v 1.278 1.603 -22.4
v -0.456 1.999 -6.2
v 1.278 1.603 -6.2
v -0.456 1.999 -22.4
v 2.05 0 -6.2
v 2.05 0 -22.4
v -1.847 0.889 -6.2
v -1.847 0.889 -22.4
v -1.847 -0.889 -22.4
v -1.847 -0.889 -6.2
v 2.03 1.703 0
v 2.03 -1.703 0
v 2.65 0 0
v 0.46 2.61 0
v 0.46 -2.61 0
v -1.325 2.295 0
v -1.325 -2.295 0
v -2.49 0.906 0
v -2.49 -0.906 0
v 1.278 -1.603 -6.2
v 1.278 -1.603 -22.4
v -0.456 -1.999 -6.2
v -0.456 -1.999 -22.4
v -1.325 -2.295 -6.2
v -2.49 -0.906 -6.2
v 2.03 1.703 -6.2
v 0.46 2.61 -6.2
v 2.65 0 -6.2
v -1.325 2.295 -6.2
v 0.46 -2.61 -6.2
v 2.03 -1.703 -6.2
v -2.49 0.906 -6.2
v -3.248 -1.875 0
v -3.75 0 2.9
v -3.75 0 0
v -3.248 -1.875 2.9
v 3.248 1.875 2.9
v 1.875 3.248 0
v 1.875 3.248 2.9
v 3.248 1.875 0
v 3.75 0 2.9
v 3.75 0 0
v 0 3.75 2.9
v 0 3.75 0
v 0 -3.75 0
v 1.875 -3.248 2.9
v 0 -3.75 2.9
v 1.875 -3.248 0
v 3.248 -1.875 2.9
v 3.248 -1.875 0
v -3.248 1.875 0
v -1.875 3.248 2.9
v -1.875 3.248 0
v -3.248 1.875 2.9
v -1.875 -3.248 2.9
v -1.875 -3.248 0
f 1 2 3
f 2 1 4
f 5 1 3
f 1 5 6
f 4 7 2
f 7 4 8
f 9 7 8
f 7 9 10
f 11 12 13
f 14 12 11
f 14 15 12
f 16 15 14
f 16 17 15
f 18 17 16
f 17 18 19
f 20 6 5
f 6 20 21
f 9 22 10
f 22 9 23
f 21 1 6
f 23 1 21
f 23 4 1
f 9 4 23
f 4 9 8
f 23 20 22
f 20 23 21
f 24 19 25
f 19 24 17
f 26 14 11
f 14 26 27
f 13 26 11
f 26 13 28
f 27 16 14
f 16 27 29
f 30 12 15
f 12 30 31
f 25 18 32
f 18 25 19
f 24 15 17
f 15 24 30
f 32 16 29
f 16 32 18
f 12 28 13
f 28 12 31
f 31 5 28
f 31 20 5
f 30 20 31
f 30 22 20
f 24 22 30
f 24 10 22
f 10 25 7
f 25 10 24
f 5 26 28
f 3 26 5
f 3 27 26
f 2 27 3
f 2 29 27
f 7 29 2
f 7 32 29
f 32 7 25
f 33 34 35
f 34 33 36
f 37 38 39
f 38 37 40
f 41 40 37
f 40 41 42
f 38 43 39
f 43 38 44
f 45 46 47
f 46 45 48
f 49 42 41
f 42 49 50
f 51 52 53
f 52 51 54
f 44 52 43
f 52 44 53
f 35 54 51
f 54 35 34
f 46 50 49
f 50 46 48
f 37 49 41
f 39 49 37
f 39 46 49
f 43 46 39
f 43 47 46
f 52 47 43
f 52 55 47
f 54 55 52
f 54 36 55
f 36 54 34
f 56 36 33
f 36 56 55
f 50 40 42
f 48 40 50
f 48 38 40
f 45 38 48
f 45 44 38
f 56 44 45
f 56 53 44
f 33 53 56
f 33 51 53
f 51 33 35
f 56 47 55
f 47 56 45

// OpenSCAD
//This is modelling a plastic screw being used as a bolt, and it's got a thicker bit so that it can slide through one side of the grip and then grab onto the other

function OuterDiameter(3dPrinterTolerance=.4) = 4.5 + 3dPrinterTolerance*2;
function BoltDiameter(3dPrinterTolerance=.4)= 3.3 + 3dPrinterTolerance*2;
function BoltLength(3dPrinterTolerance=.4)= 22 + 3dPrinterTolerance;
function BoltHeadDiameter(3dPrinterTolerance=.4)= 6.7 + 3dPrinterTolerance*2;
function BoltHeadHeight(3dPrinterTolerance=.4)= 2.5 + 3dPrinterTolerance;

//err on the side of larger tolerances for bolts

module HiLoBolt(3dPrinterTolerance=.4, PlasticWidth=4.2)
{
	union()
	{
		translate([0,0,-BoltLength(3dPrinterTolerance)])
		{
			union()
			{
				cylinder(BoltLength(3dPrinterTolerance), BoltDiameter(3dPrinterTolerance)/2, BoltDiameter(3dPrinterTolerance)/2);
				translate([0,0,BoltLength(3dPrinterTolerance)-(PlasticWidth+2)])
				{
					cylinder(PlasticWidth+2, OuterDiameter(3dPrinterTolerance)/2, OuterDiameter(3dPrinterTolerance)/2);
				}
			}
		}
		cylinder(BoltHeadHeight(3dPrinterTolerance), BoltHeadDiameter(3dPrinterTolerance)/2,BoltHeadDiameter(3dPrinterTolerance)/2);
	}
}



HiLoBolt(.4,4.2);
